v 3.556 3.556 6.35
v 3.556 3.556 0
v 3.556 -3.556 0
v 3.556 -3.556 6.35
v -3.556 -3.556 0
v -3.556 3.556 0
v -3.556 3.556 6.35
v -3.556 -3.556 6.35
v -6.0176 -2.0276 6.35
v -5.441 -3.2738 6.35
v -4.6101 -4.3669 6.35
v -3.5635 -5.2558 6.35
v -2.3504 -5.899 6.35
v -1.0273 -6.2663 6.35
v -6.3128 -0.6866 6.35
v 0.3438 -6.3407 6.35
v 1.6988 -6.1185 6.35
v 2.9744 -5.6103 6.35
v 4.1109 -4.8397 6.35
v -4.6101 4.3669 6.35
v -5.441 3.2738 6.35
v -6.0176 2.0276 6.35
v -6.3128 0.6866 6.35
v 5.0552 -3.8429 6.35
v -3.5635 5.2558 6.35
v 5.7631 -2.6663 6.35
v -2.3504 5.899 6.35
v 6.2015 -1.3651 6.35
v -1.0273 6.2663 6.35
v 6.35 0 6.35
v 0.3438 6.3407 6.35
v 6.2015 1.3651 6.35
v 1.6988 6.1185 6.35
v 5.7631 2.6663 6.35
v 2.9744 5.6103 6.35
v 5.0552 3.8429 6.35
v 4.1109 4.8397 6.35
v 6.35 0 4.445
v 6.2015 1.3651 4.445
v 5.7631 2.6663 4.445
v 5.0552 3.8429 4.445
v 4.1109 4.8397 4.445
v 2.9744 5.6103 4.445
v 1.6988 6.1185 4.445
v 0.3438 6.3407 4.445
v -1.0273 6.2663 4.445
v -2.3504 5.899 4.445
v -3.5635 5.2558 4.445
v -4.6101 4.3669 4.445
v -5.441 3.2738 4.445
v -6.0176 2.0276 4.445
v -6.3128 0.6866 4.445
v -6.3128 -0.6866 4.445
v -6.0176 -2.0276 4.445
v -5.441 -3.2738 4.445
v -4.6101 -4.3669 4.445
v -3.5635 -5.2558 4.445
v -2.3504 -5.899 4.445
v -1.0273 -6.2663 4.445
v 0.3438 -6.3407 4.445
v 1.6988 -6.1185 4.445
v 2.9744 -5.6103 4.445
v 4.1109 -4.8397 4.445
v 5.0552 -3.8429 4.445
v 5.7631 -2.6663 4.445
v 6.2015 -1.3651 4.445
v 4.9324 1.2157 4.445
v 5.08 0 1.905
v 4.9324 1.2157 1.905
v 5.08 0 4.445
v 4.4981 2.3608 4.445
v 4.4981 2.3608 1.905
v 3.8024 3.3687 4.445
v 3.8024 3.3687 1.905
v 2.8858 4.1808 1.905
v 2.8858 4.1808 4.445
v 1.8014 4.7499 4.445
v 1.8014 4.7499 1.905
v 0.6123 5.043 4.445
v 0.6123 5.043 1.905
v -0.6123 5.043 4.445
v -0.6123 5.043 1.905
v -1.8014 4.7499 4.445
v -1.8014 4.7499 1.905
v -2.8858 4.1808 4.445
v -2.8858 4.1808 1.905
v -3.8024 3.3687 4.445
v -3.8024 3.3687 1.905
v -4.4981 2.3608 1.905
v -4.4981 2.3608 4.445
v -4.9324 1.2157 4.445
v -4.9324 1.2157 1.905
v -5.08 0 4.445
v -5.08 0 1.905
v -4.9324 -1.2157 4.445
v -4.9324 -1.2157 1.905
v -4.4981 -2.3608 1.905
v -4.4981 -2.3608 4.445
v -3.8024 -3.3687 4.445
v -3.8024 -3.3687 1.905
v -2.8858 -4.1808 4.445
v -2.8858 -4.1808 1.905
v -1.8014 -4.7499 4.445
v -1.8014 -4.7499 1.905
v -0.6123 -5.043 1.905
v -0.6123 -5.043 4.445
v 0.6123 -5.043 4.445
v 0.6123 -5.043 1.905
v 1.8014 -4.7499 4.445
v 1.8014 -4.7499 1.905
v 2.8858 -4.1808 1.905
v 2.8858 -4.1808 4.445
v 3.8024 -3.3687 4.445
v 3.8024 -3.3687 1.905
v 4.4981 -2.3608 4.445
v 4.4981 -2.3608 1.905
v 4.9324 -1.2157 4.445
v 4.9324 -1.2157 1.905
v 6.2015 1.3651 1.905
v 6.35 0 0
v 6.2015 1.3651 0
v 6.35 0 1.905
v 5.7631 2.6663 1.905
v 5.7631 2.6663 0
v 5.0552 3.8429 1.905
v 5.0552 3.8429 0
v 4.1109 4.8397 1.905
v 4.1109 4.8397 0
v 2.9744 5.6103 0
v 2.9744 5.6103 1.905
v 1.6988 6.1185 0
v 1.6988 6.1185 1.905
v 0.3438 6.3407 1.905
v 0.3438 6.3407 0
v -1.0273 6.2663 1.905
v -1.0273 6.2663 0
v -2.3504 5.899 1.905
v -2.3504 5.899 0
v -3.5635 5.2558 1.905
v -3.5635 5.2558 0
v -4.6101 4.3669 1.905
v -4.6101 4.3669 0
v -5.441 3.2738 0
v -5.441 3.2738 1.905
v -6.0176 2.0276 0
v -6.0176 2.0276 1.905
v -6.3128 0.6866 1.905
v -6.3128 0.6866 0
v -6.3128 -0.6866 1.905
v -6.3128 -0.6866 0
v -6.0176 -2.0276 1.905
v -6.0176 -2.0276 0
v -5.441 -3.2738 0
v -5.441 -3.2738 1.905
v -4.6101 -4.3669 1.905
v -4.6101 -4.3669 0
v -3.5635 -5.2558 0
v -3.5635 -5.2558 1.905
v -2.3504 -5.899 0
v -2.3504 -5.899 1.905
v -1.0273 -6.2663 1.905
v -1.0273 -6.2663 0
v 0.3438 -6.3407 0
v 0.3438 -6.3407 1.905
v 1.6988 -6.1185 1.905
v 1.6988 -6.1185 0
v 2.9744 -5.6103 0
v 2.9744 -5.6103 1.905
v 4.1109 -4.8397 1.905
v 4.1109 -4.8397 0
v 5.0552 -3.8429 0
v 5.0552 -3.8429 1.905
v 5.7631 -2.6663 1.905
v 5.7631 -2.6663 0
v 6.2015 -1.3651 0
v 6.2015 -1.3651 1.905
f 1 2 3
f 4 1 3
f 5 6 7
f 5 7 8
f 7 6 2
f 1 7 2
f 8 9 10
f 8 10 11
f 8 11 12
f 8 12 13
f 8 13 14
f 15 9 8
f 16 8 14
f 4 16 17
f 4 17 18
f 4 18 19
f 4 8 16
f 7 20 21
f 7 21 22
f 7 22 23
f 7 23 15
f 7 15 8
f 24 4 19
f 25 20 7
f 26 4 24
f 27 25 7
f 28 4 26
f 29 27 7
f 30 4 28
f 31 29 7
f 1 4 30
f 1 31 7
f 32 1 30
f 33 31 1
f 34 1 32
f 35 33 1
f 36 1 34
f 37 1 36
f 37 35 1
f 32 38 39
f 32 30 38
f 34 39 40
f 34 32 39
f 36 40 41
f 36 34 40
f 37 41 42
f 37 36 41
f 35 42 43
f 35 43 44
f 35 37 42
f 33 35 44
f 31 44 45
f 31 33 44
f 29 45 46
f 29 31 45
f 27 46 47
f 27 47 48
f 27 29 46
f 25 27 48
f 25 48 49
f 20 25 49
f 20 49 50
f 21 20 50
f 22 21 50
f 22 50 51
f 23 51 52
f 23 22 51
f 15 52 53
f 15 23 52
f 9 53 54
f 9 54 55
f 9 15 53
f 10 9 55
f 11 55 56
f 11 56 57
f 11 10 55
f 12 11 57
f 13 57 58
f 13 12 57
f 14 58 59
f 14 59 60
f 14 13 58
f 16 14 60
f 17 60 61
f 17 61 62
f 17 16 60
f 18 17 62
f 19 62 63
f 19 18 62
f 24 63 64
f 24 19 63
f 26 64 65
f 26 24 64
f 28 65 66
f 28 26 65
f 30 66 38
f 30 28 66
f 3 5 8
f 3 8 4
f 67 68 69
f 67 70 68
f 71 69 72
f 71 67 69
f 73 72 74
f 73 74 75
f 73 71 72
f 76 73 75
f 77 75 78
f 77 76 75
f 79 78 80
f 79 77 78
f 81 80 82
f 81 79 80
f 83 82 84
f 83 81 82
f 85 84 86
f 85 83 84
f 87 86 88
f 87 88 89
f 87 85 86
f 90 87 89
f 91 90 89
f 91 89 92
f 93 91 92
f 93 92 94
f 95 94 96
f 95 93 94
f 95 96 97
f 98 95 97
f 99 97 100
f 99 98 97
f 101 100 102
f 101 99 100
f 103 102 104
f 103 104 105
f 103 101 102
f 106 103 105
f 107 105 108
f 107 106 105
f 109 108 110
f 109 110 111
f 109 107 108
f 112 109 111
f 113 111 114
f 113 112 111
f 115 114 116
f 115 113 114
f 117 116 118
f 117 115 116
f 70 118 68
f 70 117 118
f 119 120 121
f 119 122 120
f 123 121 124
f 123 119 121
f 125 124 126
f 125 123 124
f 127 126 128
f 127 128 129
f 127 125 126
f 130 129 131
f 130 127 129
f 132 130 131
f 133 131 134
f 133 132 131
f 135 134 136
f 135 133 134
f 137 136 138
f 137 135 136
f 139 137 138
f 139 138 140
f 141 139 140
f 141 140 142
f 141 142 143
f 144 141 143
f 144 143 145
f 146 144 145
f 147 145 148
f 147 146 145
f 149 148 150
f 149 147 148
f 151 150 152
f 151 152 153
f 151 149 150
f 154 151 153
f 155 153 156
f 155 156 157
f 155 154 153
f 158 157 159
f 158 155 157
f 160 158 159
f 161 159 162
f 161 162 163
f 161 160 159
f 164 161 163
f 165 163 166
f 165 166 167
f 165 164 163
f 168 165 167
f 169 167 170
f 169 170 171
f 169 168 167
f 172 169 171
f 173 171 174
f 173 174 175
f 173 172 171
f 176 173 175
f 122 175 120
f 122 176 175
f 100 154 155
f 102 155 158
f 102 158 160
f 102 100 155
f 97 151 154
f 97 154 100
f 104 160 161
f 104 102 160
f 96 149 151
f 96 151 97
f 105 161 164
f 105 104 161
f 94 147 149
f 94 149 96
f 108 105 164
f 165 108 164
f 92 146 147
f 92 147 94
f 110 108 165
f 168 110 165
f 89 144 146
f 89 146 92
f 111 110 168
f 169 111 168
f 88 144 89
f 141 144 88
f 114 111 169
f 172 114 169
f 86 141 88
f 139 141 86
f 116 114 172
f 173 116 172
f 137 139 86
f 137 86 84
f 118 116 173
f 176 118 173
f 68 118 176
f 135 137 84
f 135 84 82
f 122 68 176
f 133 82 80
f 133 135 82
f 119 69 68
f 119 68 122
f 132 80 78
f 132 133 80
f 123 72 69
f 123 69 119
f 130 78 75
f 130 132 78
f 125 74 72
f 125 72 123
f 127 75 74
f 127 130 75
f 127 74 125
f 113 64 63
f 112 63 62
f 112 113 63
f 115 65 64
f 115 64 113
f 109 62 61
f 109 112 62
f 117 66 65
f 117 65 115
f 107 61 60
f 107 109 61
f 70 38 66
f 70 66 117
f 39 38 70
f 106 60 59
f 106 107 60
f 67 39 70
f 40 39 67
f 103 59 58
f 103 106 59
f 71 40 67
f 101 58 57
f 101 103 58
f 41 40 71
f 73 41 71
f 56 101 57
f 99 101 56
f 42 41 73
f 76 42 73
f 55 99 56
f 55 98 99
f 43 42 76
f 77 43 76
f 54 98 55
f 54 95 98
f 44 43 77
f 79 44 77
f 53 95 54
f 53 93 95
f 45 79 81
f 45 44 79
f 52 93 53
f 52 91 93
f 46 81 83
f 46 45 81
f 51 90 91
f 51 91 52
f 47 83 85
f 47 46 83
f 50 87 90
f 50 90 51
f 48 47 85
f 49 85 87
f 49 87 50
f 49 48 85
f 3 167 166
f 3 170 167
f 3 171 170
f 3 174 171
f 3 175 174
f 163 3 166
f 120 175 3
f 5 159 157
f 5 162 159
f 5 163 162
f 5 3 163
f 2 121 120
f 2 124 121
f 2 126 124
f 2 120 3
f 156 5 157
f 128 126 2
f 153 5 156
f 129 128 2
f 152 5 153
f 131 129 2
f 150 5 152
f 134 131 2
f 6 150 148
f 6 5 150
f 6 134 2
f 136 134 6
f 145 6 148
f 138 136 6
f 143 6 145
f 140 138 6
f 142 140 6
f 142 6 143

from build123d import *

# Parameters (mm, degrees)
F2_W     = 7.112
F2_H     = 7.112
F3_DEPTH = 25.4


with BuildPart() as f1:
    # F0 (on Front) → F1 (revolve)
    with BuildSketch(Plane.XZ):
        Polygon((0, 6.35), (0, 0), (6.35, 0), (6.35, 1.905), (5.08, 1.905), (5.08, 4.445), (6.35, 4.445), (6.35, 6.35), align=None)
    revolve(axis=Axis((0, 0, 3.175), (0, 0, 1)))

    # F2 (on face) → F3 (cut)
    with BuildSketch(Plane(origin=(0, 0, 0), x_dir=(1, 0, 0), z_dir=(0, 0, -1))):
        Rectangle(F2_W, F2_H)
    extrude(amount=-F3_DEPTH, mode=Mode.SUBTRACT)


solid = f1.part
